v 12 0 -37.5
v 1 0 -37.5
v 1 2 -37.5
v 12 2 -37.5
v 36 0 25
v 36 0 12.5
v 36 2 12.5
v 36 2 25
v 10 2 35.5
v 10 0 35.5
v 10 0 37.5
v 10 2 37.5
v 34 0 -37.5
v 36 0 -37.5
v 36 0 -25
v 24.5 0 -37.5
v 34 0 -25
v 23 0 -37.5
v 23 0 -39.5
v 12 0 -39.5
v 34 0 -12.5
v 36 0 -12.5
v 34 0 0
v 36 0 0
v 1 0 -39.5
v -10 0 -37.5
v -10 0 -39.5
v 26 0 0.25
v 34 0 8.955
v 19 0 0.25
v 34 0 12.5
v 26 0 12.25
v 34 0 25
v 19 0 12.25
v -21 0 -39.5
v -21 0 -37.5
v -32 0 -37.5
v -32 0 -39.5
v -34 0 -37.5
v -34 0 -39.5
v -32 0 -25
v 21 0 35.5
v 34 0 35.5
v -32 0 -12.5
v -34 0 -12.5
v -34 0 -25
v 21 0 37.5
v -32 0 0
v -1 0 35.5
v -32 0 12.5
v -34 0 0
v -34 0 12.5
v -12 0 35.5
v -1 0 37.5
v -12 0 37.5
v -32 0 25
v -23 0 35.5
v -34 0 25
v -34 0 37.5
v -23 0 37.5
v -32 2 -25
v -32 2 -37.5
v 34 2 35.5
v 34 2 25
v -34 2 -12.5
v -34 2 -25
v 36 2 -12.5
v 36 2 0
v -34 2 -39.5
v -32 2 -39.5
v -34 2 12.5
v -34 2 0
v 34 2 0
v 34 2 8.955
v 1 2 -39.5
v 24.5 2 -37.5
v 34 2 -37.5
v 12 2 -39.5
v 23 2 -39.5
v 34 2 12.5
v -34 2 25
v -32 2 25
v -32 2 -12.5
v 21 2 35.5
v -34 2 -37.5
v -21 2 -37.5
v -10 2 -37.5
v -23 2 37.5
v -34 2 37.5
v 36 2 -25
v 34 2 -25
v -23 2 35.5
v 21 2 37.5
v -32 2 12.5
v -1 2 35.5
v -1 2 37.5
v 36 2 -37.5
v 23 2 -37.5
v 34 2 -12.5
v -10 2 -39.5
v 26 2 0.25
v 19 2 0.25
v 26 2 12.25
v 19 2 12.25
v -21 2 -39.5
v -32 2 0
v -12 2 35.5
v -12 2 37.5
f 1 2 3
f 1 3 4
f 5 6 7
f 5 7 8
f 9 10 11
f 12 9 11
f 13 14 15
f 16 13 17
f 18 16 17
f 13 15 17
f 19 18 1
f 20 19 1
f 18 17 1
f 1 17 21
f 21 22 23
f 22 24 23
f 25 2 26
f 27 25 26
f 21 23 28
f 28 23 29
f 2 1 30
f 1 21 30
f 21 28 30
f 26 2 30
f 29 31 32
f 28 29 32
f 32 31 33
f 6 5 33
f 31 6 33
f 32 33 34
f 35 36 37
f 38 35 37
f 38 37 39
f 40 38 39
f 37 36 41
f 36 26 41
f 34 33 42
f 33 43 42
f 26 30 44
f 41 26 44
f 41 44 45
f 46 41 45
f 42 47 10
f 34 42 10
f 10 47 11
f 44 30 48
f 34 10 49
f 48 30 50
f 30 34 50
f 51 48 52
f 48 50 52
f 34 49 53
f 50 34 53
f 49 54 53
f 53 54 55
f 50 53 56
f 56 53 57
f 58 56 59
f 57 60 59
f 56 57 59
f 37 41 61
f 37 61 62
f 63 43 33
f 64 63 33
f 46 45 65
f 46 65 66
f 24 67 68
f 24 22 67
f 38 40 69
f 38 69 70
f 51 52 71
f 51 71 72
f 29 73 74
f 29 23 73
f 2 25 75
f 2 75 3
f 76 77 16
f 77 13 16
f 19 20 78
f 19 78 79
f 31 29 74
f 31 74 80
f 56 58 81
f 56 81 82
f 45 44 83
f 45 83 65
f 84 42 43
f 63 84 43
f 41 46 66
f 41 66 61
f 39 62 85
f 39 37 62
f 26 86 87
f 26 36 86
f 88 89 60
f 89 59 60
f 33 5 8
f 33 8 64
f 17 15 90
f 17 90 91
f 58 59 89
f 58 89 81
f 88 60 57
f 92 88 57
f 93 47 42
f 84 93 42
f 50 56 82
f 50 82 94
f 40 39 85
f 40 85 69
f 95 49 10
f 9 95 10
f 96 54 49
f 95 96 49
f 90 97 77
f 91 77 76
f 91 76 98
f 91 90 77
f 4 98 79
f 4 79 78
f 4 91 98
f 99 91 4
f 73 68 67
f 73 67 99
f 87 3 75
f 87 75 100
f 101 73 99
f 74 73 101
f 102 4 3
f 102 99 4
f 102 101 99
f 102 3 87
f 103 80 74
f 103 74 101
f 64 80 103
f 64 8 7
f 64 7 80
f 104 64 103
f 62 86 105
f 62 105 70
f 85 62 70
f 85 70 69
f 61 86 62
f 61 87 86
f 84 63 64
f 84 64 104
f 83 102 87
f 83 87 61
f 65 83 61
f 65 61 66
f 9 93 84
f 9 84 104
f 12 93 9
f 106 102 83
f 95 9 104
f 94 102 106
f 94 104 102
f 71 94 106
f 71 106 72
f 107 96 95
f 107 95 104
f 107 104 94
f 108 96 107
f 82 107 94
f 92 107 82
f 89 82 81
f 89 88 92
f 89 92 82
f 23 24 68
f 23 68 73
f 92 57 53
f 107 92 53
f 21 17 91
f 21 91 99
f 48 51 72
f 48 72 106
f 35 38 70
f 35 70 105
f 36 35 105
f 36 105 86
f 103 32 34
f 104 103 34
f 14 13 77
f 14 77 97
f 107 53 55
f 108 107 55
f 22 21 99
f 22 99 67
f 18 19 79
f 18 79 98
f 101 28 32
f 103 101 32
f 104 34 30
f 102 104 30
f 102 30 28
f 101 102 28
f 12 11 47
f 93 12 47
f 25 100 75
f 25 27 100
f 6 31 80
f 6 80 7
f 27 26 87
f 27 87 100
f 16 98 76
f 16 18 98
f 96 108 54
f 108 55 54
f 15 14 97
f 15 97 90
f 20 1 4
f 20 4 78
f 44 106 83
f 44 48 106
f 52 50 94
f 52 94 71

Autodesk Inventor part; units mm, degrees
ref_plane "YZ Plane" through (0, 0, 0) normal (1, 0, 0) x (0, 1, 0)
ref_plane "XZ Plane" through (0, 0, 0) normal (0, 1, 0) x (-1, 0, 0)
ref_plane "XY Plane" through (0, 0, 0) normal (0, 0, 1) x (1, 0, 0)
sketch "Sketch1" plane through (0, 0, 0) normal (0, 1, 0) x (-1, 0, 0)
  line L0 (34, 37.5) -> (-34, -37.5) construction
  line L1 (-34, 37.5) -> (34, -37.5) construction
  line L2 (34, 37.5) -> (34, 25)
  line L3 (34, 25) -> (32, 25)
  line L4 (32, 25) -> (32, 12.5)
  line L5 (32, 12.5) -> (34, 12.5)
  line L6 (34, 12.5) -> (34, 0)
  line L7 (34, 0) -> (32, 0)
  line L8 (32, 0) -> (32, -12.5)
  line L9 (32, -12.5) -> (34, -12.5)
  line L10 (34, -12.5) -> (34, -25)
  line L11 (34, -25) -> (32, -25)
  line L12 (32, -25) -> (32, -37.5)
  line L13 (34, -25) -> (34, -12.5)
  line L14 (34, 0) -> (34, 12.5)
  line L15 (34, 25) -> (34, 37.5)
  line L16 (32, -39.5) -> (21, -39.5)
  line L17 (21, -39.5) -> (21, -37.5)
  line L18 (21, -37.5) -> (10, -37.5)
  line L19 (10, -37.5) -> (10, -39.5)
  line L20 (10, -39.5) -> (-1, -39.5)
  line L21 (-1, -39.5) -> (-1, -37.5)
  line L22 (-1, -37.5) -> (-12, -37.5)
  line L23 (-12, -37.5) -> (-12, -39.5)
  line L24 (-12, -39.5) -> (-23, -39.5)
  line L25 (-36, -37.5) -> (-36, -25)
  line L26 (-36, -25) -> (-34, -25)
  line L27 (-34, -25) -> (-34, -12.5)
  line L28 (-34, -12.5) -> (-36, -12.5)
  line L29 (-36, -12.5) -> (-36, 0)
  line L30 (-36, 0) -> (-34, 0)
  line L31 (-34, 0) -> (-34, 12.5)
  line L32 (-34, 12.5) -> (-34, 8.9552)
  line L33 (-34, 12.5) -> (-36, 12.5)
  line L34 (-36, 12.5) -> (-36, 25)
  line L35 (-36, 25) -> (-34, 25)
  line L36 (10, -37.5) -> (21, -37.5)
  line L37 (-34, -37.5) -> (-24.5, -37.5)
  line L38 (-12, -37.5) -> (-1, -37.5)
  line L39 (-34, -12.5) -> (-34, -25)
  line L40 (-34, 35.5) -> (-34, 25)
  line L41 (-34, 12.5) -> (-34, 0)
  line L42 (34, 37.5) -> (23, 37.5)
  line L43 (23, 37.5) -> (23, 35.5)
  line L44 (23, 35.5) -> (12, 35.5)
  line L45 (12, 35.5) -> (12, 37.5)
  line L46 (12, 37.5) -> (1, 37.5)
  line L47 (1, 37.5) -> (1, 35.5)
  line L48 (1, 35.5) -> (-10, 35.5)
  line L49 (-10, 35.5) -> (-10, 37.5)
  line L50 (-10, 37.5) -> (-21, 37.5)
  line L51 (-21, 37.5) -> (-21, 35.5)
  line L52 (-21, 35.5) -> (-34, 35.5)
  line L53 (34, 37.5) -> (23, 37.5)
  line L54 (12, 37.5) -> (1, 37.5)
  line L55 (-10, 37.5) -> (-21, 37.5)
  line L56 (-26, 12.25) -> (-19, 12.25)
  line L57 (-19, 12.25) -> (-19, 0.25)
  line L58 (-19, 0.25) -> (-26, 0.25)
  line L59 (-26, 0.25) -> (-26, 12.25)
  line L60 (-26, 12.25) -> (-19, 0.25) construction
  line L61 (-19, 12.25) -> (-26, 0.25) construction
  line L62 (32, -37.5) -> (34, -37.5)
  line L63 (34, -39.5) -> (32, -39.5)
  line L64 (34, -37.5) -> (34, -39.5)
  line L65 (-34, -37.5) -> (-36, -37.5)
  line L66 (-23, -39.5) -> (-23, -37.5)
  line L67 (-23, -37.5) -> (-24.5, -37.5)
  point P0 (0, 0)
  point P1 (-35.8133, -39.5)
  dimension "d3" = 2
  dimension "d4" = 12.5
  dimension "d5" = 12.5
  dimension "d6" = 12.5
  dimension "d7" = 12.5
  dimension "d11" = 11
  dimension "d12" = 11
  dimension "d13" = 11
  dimension "d14" = 11
  dimension "d17" = 12.5
  dimension "d18" = 2
  dimension "d19" = 12.5
  dimension "d20" = 12.5
  dimension "d21" = 2
  dimension "d22" = 12.5
  dimension "d23" = 11
  dimension "d26" = 11
  dimension "d28" = 11
  dimension "d29" = 11
  dimension "d32" = 7
  dimension "d33" = 12
  dimension "d36" = 13
extrude "Extrusion1" add sketch "Sketch1" along normal blind 2
properties part number "KANAN"
